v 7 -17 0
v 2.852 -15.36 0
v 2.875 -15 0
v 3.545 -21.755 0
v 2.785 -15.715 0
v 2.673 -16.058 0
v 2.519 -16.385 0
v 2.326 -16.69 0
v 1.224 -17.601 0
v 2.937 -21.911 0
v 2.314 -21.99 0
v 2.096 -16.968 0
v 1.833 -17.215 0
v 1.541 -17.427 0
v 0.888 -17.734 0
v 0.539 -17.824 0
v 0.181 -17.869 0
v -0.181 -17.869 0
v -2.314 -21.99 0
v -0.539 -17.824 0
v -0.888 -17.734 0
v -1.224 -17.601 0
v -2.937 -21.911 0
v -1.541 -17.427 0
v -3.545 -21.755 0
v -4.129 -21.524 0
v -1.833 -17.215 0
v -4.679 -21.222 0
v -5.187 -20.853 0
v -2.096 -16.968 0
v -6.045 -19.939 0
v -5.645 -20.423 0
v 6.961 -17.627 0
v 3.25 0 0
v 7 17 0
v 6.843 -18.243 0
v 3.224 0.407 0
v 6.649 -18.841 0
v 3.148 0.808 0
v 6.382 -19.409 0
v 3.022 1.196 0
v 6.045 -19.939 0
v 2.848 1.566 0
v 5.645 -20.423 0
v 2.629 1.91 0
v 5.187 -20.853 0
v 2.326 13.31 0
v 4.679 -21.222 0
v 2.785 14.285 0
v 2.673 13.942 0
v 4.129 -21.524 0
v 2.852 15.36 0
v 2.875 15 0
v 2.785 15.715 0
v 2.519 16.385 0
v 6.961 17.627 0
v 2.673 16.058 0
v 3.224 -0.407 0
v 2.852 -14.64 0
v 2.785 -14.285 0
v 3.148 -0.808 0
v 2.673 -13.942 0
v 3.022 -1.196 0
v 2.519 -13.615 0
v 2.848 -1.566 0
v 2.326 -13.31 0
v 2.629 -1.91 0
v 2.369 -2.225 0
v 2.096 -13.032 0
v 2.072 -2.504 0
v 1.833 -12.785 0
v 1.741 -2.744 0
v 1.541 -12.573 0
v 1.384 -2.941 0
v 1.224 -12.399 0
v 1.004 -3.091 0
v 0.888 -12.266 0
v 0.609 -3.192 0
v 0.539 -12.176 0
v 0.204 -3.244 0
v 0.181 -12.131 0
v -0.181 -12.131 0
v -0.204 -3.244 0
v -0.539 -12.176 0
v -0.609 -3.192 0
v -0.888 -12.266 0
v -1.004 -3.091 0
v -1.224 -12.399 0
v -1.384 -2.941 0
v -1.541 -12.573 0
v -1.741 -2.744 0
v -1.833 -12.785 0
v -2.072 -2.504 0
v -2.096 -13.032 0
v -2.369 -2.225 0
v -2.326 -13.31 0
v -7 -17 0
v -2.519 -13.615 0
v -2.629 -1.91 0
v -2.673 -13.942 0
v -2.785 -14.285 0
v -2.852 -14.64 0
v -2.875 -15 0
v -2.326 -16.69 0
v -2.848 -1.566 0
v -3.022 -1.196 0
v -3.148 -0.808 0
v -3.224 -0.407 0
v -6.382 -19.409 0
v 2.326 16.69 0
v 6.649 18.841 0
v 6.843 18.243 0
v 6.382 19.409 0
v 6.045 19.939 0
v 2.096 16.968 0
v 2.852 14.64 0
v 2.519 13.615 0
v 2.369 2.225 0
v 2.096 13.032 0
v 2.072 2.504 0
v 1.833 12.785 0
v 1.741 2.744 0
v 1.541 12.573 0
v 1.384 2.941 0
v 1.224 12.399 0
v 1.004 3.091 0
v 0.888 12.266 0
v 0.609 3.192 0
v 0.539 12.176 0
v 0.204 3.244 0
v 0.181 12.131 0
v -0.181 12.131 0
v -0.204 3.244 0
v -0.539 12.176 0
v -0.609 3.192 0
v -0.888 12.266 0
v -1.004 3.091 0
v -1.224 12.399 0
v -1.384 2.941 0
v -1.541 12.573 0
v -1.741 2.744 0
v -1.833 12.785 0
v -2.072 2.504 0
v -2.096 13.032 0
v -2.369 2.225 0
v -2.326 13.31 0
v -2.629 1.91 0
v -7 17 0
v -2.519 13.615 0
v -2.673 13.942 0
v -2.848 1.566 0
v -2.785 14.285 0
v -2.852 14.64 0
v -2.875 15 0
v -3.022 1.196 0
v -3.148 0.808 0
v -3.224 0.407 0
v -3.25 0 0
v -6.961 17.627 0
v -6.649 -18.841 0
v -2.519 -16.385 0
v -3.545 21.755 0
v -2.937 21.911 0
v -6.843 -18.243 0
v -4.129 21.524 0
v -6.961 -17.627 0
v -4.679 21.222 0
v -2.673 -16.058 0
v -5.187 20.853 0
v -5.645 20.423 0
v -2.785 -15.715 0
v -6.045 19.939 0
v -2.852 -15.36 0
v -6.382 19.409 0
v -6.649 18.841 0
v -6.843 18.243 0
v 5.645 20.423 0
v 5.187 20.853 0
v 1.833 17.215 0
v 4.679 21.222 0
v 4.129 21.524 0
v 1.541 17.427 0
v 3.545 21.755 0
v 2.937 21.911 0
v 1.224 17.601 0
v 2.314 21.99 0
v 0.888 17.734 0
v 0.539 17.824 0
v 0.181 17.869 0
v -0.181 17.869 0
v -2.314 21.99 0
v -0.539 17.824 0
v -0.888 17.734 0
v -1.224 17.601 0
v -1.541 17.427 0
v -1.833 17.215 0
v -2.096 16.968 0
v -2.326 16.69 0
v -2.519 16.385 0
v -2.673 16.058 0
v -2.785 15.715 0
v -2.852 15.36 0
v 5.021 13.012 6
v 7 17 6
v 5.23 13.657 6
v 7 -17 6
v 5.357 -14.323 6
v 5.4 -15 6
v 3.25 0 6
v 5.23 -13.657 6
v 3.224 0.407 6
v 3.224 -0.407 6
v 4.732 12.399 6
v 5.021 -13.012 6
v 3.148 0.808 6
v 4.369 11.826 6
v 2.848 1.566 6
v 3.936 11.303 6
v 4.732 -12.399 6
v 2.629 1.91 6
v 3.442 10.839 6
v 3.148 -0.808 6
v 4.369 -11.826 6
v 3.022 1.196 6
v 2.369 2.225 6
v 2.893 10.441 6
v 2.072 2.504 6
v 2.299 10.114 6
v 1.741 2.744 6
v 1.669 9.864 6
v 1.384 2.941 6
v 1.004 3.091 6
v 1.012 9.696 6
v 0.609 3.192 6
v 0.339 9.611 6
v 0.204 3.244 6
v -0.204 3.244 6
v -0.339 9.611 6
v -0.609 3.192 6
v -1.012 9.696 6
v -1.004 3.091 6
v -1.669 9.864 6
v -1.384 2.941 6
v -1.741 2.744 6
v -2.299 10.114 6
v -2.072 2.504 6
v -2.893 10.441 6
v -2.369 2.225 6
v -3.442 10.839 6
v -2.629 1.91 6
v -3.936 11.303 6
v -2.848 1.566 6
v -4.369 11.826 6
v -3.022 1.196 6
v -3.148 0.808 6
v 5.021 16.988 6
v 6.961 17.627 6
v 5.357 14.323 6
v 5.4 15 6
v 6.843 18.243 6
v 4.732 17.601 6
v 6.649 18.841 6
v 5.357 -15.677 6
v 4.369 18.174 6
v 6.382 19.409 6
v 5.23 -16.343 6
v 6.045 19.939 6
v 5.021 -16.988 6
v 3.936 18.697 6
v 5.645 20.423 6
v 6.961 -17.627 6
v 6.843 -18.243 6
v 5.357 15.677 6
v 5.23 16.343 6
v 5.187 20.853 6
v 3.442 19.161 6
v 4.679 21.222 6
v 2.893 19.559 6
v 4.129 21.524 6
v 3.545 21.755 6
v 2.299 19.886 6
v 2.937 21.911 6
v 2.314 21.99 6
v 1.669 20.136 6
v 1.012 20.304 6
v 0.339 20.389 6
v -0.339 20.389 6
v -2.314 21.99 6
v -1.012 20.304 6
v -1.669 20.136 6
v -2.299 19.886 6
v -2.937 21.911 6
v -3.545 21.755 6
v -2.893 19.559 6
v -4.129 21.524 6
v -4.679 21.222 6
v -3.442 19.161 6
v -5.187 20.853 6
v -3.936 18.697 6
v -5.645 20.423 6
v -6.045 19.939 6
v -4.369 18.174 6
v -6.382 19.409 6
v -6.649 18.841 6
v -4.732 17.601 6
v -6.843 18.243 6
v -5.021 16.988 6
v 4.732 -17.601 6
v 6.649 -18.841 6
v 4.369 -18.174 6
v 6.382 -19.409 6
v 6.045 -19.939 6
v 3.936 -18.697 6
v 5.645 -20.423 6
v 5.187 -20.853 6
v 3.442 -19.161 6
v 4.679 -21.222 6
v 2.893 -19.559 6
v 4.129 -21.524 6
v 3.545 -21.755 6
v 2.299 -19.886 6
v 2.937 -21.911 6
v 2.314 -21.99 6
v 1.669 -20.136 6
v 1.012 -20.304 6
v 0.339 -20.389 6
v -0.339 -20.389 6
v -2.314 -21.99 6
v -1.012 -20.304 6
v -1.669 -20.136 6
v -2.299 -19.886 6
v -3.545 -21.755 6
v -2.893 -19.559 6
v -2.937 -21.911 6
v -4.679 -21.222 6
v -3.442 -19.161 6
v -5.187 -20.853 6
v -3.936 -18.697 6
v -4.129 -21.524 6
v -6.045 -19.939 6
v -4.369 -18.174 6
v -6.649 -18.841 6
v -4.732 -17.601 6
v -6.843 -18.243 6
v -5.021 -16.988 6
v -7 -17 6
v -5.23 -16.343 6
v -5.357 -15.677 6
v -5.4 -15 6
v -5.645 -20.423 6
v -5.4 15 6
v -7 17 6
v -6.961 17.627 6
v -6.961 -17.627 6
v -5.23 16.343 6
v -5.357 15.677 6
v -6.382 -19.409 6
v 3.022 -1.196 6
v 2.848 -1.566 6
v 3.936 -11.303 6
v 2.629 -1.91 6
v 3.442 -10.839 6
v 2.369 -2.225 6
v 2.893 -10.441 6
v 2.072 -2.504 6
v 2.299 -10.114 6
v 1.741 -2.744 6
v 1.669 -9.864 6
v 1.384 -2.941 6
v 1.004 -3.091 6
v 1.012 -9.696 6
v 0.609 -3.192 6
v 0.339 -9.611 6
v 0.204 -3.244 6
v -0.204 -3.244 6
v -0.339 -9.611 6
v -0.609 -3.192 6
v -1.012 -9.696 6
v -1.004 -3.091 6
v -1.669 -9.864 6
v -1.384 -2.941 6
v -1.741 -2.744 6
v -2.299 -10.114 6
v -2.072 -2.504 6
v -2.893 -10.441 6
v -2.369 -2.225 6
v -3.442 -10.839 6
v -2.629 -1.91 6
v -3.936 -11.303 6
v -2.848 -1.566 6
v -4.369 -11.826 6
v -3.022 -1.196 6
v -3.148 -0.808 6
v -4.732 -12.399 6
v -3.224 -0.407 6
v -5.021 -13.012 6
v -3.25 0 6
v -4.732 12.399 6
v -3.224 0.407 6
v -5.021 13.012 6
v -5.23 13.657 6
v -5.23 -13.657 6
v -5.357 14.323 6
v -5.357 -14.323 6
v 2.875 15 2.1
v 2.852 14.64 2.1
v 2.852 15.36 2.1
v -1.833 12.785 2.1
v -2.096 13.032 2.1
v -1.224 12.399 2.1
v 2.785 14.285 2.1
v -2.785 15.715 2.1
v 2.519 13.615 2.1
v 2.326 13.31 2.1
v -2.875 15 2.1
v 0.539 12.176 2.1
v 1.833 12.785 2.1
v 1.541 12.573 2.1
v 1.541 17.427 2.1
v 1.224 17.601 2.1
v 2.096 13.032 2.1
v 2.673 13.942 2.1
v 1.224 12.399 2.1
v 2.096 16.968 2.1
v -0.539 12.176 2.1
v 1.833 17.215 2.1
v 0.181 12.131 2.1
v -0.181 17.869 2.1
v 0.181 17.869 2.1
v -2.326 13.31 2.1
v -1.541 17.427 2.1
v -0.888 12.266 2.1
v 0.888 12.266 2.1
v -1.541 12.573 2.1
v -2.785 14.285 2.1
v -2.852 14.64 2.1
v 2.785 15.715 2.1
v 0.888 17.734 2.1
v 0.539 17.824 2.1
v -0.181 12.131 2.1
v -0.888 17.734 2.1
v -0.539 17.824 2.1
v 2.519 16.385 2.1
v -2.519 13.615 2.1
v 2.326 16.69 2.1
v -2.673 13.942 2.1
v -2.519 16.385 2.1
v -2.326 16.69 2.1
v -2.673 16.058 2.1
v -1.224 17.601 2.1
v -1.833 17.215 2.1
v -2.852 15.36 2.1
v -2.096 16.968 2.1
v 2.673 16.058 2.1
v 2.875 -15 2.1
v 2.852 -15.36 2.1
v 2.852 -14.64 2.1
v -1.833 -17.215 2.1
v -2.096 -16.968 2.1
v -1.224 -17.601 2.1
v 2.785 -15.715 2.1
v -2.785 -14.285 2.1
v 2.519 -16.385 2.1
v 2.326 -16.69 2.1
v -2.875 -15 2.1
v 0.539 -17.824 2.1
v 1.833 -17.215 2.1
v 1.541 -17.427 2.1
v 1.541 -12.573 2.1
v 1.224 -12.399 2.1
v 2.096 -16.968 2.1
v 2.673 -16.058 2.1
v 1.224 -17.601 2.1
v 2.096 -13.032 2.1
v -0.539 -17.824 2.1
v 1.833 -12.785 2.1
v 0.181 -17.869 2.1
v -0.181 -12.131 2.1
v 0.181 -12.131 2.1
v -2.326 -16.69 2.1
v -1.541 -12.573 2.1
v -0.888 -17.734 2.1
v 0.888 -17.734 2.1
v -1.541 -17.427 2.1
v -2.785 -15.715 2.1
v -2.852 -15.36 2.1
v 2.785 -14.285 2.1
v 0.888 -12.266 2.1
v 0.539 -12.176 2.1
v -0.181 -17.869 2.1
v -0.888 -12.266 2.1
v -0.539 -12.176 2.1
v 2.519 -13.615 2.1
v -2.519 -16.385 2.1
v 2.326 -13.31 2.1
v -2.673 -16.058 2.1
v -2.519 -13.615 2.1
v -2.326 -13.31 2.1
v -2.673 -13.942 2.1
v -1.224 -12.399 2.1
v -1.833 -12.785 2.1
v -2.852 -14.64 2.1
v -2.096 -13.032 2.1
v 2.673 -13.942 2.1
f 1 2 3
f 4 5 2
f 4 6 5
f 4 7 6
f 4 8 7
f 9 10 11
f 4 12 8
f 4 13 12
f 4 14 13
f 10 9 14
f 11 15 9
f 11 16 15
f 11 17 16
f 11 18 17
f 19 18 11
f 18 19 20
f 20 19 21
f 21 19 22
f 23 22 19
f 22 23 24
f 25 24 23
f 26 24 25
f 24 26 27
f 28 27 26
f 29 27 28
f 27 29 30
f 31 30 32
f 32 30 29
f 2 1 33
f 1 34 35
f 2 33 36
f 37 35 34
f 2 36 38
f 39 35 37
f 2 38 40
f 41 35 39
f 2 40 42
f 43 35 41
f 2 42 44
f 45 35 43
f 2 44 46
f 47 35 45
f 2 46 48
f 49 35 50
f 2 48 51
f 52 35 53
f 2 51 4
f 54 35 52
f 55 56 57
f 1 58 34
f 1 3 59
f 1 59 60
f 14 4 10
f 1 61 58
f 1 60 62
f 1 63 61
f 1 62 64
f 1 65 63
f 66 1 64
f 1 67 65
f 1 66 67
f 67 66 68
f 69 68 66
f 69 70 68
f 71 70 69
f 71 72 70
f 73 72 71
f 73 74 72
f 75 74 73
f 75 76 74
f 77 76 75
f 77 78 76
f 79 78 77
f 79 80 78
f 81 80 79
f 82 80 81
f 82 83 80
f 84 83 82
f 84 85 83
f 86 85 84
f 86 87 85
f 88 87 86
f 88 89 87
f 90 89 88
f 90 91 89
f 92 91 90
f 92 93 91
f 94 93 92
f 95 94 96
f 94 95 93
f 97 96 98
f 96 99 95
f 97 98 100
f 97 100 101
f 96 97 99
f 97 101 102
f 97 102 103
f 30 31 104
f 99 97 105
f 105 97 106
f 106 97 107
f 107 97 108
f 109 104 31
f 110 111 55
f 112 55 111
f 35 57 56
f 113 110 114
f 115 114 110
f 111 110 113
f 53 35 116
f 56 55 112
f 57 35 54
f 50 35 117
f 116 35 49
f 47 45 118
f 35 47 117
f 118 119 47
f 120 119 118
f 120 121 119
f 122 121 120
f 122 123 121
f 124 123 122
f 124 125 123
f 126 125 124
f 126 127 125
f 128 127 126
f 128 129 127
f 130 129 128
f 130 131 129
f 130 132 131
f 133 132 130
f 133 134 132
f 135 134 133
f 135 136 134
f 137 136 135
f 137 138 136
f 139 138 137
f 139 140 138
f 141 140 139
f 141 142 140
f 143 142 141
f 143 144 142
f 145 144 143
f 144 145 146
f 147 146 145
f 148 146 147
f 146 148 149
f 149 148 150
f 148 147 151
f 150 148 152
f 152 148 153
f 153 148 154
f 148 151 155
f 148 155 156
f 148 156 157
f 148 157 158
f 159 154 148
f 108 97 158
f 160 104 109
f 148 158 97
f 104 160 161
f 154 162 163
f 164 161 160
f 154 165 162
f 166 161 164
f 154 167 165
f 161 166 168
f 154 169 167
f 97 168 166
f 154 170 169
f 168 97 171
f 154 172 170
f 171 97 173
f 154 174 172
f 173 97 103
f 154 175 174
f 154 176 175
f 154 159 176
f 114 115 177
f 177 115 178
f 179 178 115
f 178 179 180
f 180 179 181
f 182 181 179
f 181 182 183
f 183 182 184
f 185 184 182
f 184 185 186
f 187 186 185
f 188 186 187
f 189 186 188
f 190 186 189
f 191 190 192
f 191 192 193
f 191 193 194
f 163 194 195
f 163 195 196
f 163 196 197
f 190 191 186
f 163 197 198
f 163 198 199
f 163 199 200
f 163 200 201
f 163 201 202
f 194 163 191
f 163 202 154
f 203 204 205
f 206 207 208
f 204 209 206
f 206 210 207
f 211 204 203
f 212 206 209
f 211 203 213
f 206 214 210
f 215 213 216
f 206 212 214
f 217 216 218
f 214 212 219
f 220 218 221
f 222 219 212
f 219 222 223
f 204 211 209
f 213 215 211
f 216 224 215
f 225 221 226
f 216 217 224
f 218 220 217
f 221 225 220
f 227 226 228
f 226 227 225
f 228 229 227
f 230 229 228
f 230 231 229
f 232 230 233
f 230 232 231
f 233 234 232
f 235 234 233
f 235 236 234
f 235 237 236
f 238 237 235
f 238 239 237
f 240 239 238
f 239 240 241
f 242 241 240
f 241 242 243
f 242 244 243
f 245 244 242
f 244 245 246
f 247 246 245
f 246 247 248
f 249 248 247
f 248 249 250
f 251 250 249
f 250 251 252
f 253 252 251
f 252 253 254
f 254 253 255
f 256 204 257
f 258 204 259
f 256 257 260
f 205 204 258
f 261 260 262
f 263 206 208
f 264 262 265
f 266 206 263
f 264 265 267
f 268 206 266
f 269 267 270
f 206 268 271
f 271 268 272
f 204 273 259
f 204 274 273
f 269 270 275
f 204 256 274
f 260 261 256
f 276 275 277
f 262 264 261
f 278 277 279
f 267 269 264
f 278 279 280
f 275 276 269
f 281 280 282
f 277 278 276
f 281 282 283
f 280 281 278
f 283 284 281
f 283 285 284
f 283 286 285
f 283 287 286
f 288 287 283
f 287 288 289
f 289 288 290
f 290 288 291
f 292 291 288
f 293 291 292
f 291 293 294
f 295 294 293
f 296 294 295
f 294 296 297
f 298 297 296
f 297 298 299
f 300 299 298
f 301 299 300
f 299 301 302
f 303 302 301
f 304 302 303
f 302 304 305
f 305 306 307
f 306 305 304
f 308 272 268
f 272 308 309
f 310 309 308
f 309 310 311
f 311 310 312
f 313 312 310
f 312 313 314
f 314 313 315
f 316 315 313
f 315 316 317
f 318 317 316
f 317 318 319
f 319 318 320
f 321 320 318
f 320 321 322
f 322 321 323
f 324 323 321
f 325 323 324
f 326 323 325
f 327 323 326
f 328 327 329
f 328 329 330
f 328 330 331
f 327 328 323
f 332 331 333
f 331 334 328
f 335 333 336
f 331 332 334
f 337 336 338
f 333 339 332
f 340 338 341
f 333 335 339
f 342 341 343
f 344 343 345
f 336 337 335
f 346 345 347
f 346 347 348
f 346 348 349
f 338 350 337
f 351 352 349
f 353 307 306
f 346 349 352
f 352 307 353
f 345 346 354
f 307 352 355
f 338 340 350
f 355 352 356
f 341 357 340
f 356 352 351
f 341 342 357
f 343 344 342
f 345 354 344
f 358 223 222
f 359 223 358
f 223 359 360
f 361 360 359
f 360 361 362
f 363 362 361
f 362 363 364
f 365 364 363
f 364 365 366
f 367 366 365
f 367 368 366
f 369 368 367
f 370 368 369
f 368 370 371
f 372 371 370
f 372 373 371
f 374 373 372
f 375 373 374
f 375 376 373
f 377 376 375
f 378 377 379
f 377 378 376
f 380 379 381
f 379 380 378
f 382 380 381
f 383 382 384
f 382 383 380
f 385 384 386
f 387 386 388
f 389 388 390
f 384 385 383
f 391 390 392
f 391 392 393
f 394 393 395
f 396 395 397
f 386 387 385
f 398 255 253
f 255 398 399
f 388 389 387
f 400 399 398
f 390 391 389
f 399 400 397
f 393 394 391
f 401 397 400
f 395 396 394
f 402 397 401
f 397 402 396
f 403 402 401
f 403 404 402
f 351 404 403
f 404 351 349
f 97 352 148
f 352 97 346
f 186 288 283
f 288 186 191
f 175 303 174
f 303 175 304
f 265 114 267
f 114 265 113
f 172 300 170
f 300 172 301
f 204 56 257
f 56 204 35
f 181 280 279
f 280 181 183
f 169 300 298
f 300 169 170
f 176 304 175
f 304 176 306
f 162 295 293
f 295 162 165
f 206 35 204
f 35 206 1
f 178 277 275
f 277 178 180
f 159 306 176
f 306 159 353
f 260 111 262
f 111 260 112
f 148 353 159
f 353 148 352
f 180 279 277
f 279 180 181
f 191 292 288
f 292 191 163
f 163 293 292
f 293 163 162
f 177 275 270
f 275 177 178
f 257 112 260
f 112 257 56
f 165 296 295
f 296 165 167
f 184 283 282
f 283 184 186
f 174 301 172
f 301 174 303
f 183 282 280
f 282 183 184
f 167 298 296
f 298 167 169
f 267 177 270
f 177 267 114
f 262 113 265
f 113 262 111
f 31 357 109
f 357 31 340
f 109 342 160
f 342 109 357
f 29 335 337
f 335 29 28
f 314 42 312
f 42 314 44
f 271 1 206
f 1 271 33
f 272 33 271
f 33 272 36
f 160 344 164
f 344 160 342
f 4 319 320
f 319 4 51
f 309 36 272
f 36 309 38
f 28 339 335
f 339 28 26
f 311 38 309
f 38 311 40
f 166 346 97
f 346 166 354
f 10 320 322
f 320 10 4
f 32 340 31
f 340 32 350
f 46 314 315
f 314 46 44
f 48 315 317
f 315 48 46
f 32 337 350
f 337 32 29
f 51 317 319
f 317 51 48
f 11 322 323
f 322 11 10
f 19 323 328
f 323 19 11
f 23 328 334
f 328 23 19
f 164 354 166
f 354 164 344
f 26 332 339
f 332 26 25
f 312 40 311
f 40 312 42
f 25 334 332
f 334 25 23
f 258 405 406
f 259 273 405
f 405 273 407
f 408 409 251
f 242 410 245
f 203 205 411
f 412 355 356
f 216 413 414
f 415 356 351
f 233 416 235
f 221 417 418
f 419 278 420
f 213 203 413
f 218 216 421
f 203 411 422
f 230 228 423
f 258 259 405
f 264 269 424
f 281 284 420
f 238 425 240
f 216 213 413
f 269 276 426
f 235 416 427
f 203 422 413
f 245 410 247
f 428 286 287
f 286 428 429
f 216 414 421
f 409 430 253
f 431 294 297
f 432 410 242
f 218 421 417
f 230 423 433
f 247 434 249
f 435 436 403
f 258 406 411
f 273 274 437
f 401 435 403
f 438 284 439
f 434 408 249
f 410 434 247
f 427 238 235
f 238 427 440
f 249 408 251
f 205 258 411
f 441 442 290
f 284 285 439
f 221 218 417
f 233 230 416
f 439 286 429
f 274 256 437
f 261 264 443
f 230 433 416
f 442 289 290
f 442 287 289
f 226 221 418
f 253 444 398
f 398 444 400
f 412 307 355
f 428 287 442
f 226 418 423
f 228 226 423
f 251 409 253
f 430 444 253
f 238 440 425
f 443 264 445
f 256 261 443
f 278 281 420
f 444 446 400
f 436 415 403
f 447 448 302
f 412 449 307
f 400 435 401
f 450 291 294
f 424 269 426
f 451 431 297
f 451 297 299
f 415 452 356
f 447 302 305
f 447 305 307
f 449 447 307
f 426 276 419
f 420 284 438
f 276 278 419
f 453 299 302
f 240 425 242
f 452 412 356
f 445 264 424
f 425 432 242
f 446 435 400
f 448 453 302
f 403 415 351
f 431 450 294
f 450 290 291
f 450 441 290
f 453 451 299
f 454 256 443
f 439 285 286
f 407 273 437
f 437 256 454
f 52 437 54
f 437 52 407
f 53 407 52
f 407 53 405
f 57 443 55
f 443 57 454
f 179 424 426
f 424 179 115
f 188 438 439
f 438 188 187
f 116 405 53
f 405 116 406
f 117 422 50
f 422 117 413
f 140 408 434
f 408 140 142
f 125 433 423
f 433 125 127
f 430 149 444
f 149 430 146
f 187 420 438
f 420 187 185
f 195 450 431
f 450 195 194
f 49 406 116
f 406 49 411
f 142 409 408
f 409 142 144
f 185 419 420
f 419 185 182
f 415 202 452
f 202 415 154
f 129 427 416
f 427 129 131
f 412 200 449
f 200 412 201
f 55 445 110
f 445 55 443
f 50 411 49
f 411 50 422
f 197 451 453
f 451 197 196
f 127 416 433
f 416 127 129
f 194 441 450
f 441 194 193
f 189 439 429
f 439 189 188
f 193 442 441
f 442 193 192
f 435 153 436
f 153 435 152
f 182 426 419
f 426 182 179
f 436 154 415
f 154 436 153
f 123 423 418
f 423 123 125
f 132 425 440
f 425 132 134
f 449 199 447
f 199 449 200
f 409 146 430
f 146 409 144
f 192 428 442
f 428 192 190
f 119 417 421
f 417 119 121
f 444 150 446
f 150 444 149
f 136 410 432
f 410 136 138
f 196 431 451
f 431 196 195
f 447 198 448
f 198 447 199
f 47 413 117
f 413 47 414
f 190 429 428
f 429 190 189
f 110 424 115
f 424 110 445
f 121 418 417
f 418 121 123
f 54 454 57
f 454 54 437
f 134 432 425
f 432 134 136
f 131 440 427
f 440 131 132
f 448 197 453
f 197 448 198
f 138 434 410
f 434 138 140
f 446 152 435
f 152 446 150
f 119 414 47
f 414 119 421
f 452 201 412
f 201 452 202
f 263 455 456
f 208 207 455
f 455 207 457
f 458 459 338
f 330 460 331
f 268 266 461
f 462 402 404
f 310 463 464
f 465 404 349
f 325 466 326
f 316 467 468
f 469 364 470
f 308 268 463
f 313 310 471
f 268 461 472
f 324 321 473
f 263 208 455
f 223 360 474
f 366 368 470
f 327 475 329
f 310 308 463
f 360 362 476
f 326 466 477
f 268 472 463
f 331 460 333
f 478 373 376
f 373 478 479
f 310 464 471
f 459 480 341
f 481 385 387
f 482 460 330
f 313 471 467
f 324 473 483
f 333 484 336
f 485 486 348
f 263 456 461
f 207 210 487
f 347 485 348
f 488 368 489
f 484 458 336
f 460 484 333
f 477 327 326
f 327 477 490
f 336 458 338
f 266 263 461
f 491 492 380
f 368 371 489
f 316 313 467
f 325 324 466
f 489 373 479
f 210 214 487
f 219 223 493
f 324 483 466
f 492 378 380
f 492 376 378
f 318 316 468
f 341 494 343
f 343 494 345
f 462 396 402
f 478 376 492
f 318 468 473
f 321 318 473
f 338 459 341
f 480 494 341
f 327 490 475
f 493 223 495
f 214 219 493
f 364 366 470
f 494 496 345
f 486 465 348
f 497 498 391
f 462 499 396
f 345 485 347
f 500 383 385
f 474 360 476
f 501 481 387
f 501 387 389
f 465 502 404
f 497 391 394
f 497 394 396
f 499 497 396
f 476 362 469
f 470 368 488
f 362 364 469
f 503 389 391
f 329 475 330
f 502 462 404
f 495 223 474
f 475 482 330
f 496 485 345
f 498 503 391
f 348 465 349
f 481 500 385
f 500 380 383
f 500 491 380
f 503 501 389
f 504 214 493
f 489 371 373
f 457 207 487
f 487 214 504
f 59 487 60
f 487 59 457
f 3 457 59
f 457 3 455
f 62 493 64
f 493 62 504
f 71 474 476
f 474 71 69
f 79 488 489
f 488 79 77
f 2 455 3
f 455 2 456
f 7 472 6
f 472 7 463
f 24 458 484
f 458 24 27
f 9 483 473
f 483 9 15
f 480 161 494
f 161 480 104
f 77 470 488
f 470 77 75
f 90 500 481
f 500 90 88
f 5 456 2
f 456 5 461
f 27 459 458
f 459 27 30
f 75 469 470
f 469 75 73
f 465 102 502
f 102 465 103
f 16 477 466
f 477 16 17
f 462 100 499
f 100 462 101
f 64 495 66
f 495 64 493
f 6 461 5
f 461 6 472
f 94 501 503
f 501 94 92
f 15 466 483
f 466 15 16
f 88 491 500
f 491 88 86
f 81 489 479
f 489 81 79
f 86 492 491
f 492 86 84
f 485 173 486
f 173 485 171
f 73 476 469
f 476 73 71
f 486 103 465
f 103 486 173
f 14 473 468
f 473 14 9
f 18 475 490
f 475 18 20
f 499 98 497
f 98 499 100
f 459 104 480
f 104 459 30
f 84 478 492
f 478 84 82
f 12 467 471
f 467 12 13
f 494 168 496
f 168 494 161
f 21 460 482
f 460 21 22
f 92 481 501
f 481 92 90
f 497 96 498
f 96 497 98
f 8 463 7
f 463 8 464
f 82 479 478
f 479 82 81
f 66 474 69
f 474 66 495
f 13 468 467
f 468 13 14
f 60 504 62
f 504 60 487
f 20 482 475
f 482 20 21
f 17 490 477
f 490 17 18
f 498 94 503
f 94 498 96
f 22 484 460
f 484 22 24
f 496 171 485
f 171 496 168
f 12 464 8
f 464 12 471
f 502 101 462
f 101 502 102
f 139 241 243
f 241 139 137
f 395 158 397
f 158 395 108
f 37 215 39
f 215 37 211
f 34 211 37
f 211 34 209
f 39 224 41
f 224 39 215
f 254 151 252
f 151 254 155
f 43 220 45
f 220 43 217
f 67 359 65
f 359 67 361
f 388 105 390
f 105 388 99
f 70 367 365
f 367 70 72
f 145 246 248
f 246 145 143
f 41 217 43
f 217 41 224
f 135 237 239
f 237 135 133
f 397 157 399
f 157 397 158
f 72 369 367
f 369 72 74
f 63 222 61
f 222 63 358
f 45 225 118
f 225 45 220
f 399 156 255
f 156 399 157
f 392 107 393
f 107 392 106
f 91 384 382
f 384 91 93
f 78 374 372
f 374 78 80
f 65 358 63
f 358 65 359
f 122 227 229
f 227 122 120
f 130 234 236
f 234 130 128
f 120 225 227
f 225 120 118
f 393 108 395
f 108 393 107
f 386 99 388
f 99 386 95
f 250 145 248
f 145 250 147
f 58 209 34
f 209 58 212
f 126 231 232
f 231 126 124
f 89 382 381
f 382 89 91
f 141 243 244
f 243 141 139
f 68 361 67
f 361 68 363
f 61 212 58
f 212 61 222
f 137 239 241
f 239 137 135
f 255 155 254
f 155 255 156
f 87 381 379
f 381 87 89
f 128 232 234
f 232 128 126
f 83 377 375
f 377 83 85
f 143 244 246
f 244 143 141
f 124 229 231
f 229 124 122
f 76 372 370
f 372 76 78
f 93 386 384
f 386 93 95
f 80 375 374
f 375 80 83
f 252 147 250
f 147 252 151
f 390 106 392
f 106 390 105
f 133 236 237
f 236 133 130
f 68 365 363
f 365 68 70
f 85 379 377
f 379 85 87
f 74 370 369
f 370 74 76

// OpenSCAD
$fn = 50;


difference() {
	union() {
		cylinder(h = 6, r = 7.0000000000);
		translate(v = [0.0000000000, 7.5000000000, 0]) {
			hull() {
				translate(v = [-2.0000000000, 9.5000000000, 0]) {
					cylinder(h = 6, r = 5);
				}
				translate(v = [2.0000000000, 9.5000000000, 0]) {
					cylinder(h = 6, r = 5);
				}
				translate(v = [-2.0000000000, -9.5000000000, 0]) {
					cylinder(h = 6, r = 5);
				}
				translate(v = [2.0000000000, -9.5000000000, 0]) {
					cylinder(h = 6, r = 5);
				}
			}
		}
		translate(v = [0.0000000000, 7.5000000000, 0]) {
			hull() {
				translate(v = [-2.0000000000, 9.5000000000, 0]) {
					cylinder(h = 6, r = 5);
				}
				translate(v = [2.0000000000, 9.5000000000, 0]) {
					cylinder(h = 6, r = 5);
				}
				translate(v = [-2.0000000000, -9.5000000000, 0]) {
					cylinder(h = 6, r = 5);
				}
				translate(v = [2.0000000000, -9.5000000000, 0]) {
					cylinder(h = 6, r = 5);
				}
			}
		}
		translate(v = [0.0000000000, -7.5000000000, 0]) {
			hull() {
				translate(v = [-2.0000000000, 9.5000000000, 0]) {
					cylinder(h = 6, r = 5);
				}
				translate(v = [2.0000000000, 9.5000000000, 0]) {
					cylinder(h = 6, r = 5);
				}
				translate(v = [-2.0000000000, -9.5000000000, 0]) {
					cylinder(h = 6, r = 5);
				}
				translate(v = [2.0000000000, -9.5000000000, 0]) {
					cylinder(h = 6, r = 5);
				}
			}
		}
		translate(v = [0.0000000000, -7.5000000000, 0]) {
			hull() {
				translate(v = [-2.0000000000, 9.5000000000, 0]) {
					cylinder(h = 6, r = 5);
				}
				translate(v = [2.0000000000, 9.5000000000, 0]) {
					cylinder(h = 6, r = 5);
				}
				translate(v = [-2.0000000000, -9.5000000000, 0]) {
					cylinder(h = 6, r = 5);
				}
				translate(v = [2.0000000000, -9.5000000000, 0]) {
					cylinder(h = 6, r = 5);
				}
			}
		}
	}
	union() {
		translate(v = [0.0000000000, 15.0000000000, 6]) {
			rotate(a = [0, 0, 0]) {
				difference() {
					union() {
						#translate(v = [0, 0, -6.0000000000]) {
							cylinder(h = 6, r = 2.6000000000);
						}
						#translate(v = [0, 0, -3.9000000000]) {
							cylinder(h = 3.9000000000, r1 = 2.8750000000, r2 = 5.4000000000);
						}
						#translate(v = [0, 0, -6.0000000000]) {
							cylinder(h = 6, r = 2.8750000000);
						}
						#translate(v = [0, 0, -6.0000000000]) {
							cylinder(h = 6, r = 2.6000000000);
						}
					}
					union();
				}
			}
		}
		translate(v = [0.0000000000, 15.0000000000, 6]) {
			rotate(a = [0, 0, 0]) {
				difference() {
					union() {
						#translate(v = [0, 0, -6.0000000000]) {
							cylinder(h = 6, r = 2.6000000000);
						}
						#translate(v = [0, 0, -3.9000000000]) {
							cylinder(h = 3.9000000000, r1 = 2.8750000000, r2 = 5.4000000000);
						}
						#translate(v = [0, 0, -6.0000000000]) {
							cylinder(h = 6, r = 2.8750000000);
						}
						#translate(v = [0, 0, -6.0000000000]) {
							cylinder(h = 6, r = 2.6000000000);
						}
					}
					union();
				}
			}
		}
		translate(v = [0.0000000000, -15.0000000000, 6]) {
			rotate(a = [0, 0, 0]) {
				difference() {
					union() {
						#translate(v = [0, 0, -6.0000000000]) {
							cylinder(h = 6, r = 2.6000000000);
						}
						#translate(v = [0, 0, -3.9000000000]) {
							cylinder(h = 3.9000000000, r1 = 2.8750000000, r2 = 5.4000000000);
						}
						#translate(v = [0, 0, -6.0000000000]) {
							cylinder(h = 6, r = 2.8750000000);
						}
						#translate(v = [0, 0, -6.0000000000]) {
							cylinder(h = 6, r = 2.6000000000);
						}
					}
					union();
				}
			}
		}
		translate(v = [0.0000000000, -15.0000000000, 6]) {
			rotate(a = [0, 0, 0]) {
				difference() {
					union() {
						#translate(v = [0, 0, -6.0000000000]) {
							cylinder(h = 6, r = 2.6000000000);
						}
						#translate(v = [0, 0, -3.9000000000]) {
							cylinder(h = 3.9000000000, r1 = 2.8750000000, r2 = 5.4000000000);
						}
						#translate(v = [0, 0, -6.0000000000]) {
							cylinder(h = 6, r = 2.8750000000);
						}
						#translate(v = [0, 0, -6.0000000000]) {
							cylinder(h = 6, r = 2.6000000000);
						}
					}
					union();
				}
			}
		}
		translate(v = [0, 0, -100]) {
			cylinder(h = 200, r = 3.2500000000);
		}
		translate(v = [0, 0, -100]) {
			cylinder(h = 200, r = 1.8000000000);
		}
	}
}
